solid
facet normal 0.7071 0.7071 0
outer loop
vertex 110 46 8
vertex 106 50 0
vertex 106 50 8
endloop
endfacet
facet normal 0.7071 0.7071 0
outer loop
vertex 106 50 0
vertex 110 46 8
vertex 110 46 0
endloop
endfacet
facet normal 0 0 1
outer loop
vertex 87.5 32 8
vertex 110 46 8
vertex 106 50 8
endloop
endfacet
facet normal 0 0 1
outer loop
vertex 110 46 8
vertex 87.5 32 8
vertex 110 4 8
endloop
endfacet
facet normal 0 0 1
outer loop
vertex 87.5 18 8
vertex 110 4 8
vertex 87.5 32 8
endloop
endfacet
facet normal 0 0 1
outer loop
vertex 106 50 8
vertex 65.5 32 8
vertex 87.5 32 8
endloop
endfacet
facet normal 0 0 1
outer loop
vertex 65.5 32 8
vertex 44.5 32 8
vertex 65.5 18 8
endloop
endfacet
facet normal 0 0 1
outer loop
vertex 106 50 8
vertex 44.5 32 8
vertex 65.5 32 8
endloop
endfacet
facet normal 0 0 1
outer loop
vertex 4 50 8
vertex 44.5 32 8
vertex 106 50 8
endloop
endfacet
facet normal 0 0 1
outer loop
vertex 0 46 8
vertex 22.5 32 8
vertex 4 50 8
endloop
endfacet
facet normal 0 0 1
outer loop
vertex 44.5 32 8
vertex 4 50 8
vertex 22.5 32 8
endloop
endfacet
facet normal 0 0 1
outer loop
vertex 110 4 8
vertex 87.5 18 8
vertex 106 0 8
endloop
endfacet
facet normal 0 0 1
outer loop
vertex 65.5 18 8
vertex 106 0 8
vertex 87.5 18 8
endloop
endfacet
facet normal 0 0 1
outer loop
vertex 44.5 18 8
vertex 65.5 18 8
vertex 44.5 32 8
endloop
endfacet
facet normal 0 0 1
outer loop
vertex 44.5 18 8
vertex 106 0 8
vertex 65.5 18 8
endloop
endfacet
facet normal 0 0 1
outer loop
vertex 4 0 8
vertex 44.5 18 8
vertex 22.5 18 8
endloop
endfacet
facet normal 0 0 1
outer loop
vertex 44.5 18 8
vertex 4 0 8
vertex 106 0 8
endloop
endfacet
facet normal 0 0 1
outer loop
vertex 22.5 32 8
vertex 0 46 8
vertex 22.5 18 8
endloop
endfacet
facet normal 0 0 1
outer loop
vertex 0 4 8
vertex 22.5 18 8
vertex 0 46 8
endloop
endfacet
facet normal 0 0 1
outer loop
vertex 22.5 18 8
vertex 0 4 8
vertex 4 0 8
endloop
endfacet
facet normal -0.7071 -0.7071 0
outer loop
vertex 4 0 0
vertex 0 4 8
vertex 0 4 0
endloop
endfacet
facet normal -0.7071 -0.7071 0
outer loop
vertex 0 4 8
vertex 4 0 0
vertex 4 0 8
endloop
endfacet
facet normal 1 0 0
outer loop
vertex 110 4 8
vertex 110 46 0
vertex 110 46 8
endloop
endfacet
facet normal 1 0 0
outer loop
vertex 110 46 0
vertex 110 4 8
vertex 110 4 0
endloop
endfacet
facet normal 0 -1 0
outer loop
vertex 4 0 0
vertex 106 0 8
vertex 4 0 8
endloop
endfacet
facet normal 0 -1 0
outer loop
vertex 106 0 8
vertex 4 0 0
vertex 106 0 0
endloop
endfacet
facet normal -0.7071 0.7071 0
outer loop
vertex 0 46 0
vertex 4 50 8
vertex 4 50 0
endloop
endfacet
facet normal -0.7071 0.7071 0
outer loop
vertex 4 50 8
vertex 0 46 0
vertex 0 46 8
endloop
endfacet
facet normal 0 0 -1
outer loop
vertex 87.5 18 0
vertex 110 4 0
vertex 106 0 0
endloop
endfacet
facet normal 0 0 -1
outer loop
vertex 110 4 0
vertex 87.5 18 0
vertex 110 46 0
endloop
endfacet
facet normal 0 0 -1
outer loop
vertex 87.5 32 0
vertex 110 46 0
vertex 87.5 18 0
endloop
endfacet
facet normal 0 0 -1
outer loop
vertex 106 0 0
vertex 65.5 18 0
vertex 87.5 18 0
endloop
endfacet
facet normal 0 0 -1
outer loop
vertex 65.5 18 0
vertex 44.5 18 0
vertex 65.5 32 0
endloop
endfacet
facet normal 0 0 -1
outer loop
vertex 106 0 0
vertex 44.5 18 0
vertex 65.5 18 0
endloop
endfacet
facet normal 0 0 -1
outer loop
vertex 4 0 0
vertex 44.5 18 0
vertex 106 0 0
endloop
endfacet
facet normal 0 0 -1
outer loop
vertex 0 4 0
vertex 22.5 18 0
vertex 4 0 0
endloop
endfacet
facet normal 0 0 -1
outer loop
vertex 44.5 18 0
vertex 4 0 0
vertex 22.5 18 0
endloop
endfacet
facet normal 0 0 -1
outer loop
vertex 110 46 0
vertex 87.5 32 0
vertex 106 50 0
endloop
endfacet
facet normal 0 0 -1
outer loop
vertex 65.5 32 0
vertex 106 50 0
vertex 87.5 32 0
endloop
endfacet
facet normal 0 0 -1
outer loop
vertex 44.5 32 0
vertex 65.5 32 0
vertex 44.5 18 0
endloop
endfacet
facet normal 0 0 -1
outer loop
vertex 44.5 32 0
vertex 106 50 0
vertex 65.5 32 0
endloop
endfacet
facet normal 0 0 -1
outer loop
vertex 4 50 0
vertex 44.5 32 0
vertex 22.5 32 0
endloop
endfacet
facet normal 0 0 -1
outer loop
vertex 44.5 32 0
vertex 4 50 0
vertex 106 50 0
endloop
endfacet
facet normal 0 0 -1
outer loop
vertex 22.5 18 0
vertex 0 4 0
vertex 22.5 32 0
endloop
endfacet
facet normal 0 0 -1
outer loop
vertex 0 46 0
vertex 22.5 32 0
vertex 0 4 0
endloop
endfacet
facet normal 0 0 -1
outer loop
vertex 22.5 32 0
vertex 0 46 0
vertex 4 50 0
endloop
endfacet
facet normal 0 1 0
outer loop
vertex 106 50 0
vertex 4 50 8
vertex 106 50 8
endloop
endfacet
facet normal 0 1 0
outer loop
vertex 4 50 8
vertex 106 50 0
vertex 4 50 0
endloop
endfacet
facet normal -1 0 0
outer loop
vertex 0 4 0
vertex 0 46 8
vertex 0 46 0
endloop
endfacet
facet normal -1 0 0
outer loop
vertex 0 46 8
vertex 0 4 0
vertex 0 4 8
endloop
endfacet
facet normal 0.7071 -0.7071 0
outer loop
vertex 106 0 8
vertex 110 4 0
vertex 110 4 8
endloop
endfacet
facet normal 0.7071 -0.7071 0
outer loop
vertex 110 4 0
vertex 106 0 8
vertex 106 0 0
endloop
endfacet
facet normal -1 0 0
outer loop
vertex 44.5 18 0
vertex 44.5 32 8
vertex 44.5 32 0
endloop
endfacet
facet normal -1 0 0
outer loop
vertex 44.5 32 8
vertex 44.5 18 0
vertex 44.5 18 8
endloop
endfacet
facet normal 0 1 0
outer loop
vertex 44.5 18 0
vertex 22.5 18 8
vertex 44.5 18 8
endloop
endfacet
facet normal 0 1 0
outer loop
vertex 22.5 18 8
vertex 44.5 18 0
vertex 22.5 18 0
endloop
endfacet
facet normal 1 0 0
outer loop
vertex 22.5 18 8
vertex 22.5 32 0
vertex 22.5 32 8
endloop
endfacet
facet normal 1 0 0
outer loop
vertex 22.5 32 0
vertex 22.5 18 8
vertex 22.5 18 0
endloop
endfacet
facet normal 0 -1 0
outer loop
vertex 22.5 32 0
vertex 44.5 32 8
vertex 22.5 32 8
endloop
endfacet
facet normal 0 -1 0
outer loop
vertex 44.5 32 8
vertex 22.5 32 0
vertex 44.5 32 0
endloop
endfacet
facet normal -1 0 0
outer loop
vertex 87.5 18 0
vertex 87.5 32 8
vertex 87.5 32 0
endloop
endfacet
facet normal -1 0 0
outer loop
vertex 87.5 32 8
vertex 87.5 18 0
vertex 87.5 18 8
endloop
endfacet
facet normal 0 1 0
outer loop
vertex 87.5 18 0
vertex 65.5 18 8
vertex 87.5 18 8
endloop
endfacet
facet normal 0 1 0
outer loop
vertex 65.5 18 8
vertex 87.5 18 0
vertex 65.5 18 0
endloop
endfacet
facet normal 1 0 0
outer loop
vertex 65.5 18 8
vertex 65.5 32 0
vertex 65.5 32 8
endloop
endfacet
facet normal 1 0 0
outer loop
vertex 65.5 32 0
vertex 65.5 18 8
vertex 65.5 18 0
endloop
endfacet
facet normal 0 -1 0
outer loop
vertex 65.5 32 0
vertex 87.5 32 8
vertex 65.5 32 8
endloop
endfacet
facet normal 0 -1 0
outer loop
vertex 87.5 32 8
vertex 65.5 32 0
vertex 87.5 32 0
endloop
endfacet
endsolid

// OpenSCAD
$fn = 32;

// ----------------------------------------------------------------------
// Windowed plate: 2 voids, 110 x 50 x 8 mm
// ----------------------------------------------------------------------

// --- parameters (mm) ---
plate_l = 110;            // plate length, X
plate_w = 50;             // plate width, Y
plate_t = 8;              // plate thickness, Z
edge_margin = 12;         // wall from the plate edge to any window
windows = 2;              // number of windows in the row
win_l = 22;               // window length
win_w = 14;               // window width
win_pitch = 43;           // window pitch along X
depth_1 = 8;              // depth of void 1 (full thickness = through)
depth_2 = 8;              // depth of void 2 (full thickness = through)
corner_c = 4;             // corner chamfer of the plate

profile = [[4, 0], [106, 0], [110, 4], [110, 46], [106, 50], [4, 50], [0, 46], [0, 4]];  // primary outline, 8 points, counter clockwise
void_1 = [[22.5, 18], [44.5, 18], [44.5, 32], [22.5, 32]];  // window 1 of the row, 4 points
void_2 = [[65.5, 18], [87.5, 18], [87.5, 32], [65.5, 32]];  // window 2 of the row, 4 points

// --- the one profile operation ---
difference() {
  linear_extrude(height = plate_t) polygon(points = profile);
  translate([0, 0, -1])
    linear_extrude(height = plate_t + 2) polygon(points = void_1);
  translate([0, 0, -1])
    linear_extrude(height = plate_t + 2) polygon(points = void_2);
}
